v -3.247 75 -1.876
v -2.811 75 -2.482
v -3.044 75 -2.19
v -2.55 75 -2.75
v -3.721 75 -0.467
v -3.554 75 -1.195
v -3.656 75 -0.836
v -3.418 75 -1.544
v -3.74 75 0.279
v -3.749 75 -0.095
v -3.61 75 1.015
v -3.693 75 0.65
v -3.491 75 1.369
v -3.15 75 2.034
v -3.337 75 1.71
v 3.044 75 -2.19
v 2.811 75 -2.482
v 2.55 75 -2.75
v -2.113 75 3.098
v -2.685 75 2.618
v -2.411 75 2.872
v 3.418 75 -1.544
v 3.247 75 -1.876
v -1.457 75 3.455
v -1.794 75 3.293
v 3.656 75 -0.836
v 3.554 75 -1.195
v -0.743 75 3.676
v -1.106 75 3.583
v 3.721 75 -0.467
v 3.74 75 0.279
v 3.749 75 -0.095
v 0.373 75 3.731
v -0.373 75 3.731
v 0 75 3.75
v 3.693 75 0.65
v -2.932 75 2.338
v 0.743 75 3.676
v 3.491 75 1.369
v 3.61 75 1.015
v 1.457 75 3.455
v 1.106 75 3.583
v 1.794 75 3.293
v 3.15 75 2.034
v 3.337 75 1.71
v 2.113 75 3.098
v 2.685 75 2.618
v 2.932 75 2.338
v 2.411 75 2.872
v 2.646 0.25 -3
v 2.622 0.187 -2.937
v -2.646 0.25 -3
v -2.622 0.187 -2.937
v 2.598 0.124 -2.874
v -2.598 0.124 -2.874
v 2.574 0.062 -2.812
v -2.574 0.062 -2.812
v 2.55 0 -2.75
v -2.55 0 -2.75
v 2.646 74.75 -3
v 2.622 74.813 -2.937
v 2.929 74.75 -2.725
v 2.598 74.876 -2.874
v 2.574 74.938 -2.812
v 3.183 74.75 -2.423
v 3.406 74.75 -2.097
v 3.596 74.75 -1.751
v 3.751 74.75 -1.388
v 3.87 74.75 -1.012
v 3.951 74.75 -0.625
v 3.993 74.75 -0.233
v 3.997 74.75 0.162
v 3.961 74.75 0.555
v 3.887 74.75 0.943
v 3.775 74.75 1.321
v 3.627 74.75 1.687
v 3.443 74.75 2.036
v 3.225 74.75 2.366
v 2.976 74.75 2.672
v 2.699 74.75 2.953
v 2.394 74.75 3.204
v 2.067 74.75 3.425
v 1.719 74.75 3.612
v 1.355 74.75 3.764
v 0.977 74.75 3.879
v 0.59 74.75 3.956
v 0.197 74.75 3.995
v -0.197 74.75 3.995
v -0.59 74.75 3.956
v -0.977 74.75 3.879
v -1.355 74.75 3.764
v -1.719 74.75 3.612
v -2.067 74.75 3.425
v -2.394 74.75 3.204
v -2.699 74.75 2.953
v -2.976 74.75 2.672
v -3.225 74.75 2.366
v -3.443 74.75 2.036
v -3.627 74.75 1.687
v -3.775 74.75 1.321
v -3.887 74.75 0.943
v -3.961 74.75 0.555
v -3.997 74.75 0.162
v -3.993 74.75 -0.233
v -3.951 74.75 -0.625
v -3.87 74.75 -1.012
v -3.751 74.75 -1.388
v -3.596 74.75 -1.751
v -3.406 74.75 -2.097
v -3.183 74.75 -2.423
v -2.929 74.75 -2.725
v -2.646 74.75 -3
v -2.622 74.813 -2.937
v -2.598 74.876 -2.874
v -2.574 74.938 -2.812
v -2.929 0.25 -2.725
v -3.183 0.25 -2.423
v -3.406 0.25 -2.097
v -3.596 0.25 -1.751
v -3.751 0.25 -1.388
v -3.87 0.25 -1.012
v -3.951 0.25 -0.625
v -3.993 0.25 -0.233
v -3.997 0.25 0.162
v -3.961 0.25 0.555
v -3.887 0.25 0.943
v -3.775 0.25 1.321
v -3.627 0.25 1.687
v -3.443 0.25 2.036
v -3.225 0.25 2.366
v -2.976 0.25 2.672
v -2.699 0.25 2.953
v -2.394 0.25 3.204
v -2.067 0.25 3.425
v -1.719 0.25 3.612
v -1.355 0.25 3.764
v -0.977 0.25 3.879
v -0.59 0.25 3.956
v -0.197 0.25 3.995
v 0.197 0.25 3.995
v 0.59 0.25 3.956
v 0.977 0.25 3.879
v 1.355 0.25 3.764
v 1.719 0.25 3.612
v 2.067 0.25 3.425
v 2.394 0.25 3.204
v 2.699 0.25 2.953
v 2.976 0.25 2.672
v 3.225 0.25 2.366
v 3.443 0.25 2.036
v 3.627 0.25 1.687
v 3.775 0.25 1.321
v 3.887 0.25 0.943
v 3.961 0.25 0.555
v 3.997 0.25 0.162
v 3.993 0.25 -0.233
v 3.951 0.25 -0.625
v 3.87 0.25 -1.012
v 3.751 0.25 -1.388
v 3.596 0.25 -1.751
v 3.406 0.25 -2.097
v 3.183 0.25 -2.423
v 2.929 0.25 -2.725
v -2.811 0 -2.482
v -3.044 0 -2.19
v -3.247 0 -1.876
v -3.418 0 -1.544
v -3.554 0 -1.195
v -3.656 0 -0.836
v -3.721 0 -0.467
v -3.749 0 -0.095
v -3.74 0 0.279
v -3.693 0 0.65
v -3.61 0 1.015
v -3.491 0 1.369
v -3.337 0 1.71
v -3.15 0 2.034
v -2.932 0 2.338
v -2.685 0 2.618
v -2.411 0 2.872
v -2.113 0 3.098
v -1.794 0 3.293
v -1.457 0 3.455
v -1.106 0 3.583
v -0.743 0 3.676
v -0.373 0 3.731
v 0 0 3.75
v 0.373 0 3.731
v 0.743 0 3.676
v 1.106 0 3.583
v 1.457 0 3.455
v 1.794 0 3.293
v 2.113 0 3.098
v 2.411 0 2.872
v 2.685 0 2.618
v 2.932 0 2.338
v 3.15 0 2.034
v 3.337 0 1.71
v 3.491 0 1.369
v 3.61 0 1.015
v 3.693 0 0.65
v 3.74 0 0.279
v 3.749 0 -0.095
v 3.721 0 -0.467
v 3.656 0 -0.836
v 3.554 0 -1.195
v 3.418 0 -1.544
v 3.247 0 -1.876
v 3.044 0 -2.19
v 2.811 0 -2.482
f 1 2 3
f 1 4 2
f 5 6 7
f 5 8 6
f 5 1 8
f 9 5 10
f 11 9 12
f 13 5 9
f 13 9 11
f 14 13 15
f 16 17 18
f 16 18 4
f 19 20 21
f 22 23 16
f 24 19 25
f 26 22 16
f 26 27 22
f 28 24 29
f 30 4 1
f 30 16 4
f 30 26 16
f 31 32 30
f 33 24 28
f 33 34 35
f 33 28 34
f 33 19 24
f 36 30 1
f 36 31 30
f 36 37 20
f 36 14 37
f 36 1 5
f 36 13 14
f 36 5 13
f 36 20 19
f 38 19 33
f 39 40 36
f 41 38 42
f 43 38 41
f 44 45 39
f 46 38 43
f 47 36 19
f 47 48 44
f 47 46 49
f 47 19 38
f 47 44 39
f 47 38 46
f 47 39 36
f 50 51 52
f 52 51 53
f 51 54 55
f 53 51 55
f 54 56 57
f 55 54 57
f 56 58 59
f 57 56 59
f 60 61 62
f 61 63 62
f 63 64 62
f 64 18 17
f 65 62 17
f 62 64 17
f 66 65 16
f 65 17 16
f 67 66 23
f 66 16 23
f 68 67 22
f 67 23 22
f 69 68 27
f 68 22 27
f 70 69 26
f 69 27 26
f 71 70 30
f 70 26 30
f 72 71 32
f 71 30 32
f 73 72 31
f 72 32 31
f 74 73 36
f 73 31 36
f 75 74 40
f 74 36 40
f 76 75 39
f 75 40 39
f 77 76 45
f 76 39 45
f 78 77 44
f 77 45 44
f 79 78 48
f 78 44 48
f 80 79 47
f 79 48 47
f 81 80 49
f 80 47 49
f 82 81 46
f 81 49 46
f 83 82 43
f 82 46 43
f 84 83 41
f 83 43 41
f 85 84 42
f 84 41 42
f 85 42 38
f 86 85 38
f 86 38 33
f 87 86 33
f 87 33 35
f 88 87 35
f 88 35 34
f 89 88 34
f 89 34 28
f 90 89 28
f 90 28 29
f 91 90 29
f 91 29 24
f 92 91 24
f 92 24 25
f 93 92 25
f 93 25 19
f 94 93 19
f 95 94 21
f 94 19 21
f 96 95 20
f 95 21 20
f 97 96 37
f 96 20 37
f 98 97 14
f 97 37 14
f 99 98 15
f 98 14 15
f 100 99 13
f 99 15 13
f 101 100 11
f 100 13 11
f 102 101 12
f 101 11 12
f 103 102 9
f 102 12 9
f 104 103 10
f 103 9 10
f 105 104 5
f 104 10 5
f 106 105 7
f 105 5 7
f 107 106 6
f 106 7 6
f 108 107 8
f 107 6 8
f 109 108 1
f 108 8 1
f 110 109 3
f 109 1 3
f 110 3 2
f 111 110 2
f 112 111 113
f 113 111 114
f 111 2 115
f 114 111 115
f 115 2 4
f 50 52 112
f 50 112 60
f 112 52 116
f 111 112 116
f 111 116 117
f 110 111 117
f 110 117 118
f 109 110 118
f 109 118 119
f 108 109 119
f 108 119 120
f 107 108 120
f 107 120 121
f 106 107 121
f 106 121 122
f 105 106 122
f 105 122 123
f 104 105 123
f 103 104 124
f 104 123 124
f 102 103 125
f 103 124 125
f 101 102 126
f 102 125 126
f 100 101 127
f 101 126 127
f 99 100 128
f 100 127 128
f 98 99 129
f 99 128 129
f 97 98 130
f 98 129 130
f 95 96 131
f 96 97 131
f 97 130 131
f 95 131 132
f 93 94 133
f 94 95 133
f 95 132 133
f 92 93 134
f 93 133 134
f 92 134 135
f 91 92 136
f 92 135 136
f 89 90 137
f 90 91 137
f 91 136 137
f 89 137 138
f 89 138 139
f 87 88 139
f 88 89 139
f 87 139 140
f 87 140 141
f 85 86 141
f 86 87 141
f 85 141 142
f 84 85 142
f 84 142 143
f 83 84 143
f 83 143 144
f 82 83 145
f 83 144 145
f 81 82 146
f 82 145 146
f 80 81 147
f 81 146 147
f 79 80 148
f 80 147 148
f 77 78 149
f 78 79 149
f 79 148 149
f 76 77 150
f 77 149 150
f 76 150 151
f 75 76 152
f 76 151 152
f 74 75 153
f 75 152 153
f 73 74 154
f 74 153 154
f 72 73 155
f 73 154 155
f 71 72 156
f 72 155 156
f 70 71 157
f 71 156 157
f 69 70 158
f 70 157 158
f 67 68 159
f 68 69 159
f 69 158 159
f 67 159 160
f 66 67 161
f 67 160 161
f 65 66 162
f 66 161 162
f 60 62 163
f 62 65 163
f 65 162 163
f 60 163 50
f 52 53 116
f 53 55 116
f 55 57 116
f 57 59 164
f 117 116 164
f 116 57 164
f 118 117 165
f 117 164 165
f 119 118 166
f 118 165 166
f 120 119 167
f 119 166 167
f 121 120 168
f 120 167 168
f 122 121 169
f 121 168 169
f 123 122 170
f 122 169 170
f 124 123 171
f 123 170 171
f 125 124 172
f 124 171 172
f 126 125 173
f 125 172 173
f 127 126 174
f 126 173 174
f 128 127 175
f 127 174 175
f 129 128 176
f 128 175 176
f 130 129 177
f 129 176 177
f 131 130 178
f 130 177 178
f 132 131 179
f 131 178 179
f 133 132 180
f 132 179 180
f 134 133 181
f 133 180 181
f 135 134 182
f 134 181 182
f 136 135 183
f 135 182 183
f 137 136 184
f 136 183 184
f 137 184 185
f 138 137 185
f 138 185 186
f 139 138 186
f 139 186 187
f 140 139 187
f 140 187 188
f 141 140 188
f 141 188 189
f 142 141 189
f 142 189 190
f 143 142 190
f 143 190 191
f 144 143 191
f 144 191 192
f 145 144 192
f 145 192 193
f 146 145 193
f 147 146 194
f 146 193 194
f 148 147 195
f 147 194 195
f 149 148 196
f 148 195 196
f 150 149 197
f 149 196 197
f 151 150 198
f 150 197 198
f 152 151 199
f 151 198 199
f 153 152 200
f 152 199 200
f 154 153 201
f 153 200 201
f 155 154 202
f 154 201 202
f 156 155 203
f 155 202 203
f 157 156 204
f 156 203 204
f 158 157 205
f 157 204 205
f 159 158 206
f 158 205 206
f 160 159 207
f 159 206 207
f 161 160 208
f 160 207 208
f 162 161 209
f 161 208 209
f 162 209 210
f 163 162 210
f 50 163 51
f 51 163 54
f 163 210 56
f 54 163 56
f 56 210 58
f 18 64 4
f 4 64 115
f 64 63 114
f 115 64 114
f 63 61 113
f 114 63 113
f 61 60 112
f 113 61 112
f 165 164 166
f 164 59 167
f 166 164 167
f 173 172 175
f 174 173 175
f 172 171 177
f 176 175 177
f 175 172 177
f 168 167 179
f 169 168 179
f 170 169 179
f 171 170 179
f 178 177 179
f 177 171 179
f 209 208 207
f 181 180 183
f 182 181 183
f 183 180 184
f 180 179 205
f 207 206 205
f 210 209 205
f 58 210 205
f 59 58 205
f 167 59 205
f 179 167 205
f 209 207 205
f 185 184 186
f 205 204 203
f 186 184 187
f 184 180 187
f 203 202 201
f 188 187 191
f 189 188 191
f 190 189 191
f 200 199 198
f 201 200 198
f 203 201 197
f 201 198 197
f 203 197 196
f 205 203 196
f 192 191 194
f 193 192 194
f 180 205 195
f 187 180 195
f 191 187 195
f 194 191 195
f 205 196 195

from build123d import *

# Parameters (mm, degrees)
SKETCH1_R               = 4
BOSS_EXTRUDE1_DEPTH     = 75
CUT_EXTRUDE1_DEPTH      = 76.213030786
CUT_EXTRUDE1_DEPTH_BACK = 76.213030786
CHAMFER1_SIZE           = 0.25


with BuildPart() as part:
    # Sketch1 → Boss-Extrude1 (new body)
    with BuildSketch(Plane(origin=(0, 0, 0), x_dir=(1, 0, 0), z_dir=(0, 1, 0))):
        with Locations(Location((0, 0, 0), (0, 0, 270))):
            Circle(SKETCH1_R)
    extrude(amount=BOSS_EXTRUDE1_DEPTH)

    # Sketch2 → Cut-Extrude1 (cut, two sides: drawn at the far end of the back side and taken through both)
    with BuildSketch(Plane(origin=(0, 75, 0), x_dir=(1, 0, 0), z_dir=(0, 1, 0)).offset(-CUT_EXTRUDE1_DEPTH_BACK)):
        with BuildLine():
            Line((-4, 3), (4, 3))
            ThreePointArc((4, 3), (0, 5), (-4, 3))
        make_face()
    extrude(amount=CUT_EXTRUDE1_DEPTH + CUT_EXTRUDE1_DEPTH_BACK, mode=Mode.SUBTRACT)

    # Chamfer1
    chamfer1_edges = [part.edges().sort_by_distance(p)[0] for p in [
        (0, 0, 4),
        (0, 0, -3),
        (0, 75, 4),
        (0, 75, -3),
    ]]
    chamfer(chamfer1_edges, length=CHAMFER1_SIZE)


solid = part.part
